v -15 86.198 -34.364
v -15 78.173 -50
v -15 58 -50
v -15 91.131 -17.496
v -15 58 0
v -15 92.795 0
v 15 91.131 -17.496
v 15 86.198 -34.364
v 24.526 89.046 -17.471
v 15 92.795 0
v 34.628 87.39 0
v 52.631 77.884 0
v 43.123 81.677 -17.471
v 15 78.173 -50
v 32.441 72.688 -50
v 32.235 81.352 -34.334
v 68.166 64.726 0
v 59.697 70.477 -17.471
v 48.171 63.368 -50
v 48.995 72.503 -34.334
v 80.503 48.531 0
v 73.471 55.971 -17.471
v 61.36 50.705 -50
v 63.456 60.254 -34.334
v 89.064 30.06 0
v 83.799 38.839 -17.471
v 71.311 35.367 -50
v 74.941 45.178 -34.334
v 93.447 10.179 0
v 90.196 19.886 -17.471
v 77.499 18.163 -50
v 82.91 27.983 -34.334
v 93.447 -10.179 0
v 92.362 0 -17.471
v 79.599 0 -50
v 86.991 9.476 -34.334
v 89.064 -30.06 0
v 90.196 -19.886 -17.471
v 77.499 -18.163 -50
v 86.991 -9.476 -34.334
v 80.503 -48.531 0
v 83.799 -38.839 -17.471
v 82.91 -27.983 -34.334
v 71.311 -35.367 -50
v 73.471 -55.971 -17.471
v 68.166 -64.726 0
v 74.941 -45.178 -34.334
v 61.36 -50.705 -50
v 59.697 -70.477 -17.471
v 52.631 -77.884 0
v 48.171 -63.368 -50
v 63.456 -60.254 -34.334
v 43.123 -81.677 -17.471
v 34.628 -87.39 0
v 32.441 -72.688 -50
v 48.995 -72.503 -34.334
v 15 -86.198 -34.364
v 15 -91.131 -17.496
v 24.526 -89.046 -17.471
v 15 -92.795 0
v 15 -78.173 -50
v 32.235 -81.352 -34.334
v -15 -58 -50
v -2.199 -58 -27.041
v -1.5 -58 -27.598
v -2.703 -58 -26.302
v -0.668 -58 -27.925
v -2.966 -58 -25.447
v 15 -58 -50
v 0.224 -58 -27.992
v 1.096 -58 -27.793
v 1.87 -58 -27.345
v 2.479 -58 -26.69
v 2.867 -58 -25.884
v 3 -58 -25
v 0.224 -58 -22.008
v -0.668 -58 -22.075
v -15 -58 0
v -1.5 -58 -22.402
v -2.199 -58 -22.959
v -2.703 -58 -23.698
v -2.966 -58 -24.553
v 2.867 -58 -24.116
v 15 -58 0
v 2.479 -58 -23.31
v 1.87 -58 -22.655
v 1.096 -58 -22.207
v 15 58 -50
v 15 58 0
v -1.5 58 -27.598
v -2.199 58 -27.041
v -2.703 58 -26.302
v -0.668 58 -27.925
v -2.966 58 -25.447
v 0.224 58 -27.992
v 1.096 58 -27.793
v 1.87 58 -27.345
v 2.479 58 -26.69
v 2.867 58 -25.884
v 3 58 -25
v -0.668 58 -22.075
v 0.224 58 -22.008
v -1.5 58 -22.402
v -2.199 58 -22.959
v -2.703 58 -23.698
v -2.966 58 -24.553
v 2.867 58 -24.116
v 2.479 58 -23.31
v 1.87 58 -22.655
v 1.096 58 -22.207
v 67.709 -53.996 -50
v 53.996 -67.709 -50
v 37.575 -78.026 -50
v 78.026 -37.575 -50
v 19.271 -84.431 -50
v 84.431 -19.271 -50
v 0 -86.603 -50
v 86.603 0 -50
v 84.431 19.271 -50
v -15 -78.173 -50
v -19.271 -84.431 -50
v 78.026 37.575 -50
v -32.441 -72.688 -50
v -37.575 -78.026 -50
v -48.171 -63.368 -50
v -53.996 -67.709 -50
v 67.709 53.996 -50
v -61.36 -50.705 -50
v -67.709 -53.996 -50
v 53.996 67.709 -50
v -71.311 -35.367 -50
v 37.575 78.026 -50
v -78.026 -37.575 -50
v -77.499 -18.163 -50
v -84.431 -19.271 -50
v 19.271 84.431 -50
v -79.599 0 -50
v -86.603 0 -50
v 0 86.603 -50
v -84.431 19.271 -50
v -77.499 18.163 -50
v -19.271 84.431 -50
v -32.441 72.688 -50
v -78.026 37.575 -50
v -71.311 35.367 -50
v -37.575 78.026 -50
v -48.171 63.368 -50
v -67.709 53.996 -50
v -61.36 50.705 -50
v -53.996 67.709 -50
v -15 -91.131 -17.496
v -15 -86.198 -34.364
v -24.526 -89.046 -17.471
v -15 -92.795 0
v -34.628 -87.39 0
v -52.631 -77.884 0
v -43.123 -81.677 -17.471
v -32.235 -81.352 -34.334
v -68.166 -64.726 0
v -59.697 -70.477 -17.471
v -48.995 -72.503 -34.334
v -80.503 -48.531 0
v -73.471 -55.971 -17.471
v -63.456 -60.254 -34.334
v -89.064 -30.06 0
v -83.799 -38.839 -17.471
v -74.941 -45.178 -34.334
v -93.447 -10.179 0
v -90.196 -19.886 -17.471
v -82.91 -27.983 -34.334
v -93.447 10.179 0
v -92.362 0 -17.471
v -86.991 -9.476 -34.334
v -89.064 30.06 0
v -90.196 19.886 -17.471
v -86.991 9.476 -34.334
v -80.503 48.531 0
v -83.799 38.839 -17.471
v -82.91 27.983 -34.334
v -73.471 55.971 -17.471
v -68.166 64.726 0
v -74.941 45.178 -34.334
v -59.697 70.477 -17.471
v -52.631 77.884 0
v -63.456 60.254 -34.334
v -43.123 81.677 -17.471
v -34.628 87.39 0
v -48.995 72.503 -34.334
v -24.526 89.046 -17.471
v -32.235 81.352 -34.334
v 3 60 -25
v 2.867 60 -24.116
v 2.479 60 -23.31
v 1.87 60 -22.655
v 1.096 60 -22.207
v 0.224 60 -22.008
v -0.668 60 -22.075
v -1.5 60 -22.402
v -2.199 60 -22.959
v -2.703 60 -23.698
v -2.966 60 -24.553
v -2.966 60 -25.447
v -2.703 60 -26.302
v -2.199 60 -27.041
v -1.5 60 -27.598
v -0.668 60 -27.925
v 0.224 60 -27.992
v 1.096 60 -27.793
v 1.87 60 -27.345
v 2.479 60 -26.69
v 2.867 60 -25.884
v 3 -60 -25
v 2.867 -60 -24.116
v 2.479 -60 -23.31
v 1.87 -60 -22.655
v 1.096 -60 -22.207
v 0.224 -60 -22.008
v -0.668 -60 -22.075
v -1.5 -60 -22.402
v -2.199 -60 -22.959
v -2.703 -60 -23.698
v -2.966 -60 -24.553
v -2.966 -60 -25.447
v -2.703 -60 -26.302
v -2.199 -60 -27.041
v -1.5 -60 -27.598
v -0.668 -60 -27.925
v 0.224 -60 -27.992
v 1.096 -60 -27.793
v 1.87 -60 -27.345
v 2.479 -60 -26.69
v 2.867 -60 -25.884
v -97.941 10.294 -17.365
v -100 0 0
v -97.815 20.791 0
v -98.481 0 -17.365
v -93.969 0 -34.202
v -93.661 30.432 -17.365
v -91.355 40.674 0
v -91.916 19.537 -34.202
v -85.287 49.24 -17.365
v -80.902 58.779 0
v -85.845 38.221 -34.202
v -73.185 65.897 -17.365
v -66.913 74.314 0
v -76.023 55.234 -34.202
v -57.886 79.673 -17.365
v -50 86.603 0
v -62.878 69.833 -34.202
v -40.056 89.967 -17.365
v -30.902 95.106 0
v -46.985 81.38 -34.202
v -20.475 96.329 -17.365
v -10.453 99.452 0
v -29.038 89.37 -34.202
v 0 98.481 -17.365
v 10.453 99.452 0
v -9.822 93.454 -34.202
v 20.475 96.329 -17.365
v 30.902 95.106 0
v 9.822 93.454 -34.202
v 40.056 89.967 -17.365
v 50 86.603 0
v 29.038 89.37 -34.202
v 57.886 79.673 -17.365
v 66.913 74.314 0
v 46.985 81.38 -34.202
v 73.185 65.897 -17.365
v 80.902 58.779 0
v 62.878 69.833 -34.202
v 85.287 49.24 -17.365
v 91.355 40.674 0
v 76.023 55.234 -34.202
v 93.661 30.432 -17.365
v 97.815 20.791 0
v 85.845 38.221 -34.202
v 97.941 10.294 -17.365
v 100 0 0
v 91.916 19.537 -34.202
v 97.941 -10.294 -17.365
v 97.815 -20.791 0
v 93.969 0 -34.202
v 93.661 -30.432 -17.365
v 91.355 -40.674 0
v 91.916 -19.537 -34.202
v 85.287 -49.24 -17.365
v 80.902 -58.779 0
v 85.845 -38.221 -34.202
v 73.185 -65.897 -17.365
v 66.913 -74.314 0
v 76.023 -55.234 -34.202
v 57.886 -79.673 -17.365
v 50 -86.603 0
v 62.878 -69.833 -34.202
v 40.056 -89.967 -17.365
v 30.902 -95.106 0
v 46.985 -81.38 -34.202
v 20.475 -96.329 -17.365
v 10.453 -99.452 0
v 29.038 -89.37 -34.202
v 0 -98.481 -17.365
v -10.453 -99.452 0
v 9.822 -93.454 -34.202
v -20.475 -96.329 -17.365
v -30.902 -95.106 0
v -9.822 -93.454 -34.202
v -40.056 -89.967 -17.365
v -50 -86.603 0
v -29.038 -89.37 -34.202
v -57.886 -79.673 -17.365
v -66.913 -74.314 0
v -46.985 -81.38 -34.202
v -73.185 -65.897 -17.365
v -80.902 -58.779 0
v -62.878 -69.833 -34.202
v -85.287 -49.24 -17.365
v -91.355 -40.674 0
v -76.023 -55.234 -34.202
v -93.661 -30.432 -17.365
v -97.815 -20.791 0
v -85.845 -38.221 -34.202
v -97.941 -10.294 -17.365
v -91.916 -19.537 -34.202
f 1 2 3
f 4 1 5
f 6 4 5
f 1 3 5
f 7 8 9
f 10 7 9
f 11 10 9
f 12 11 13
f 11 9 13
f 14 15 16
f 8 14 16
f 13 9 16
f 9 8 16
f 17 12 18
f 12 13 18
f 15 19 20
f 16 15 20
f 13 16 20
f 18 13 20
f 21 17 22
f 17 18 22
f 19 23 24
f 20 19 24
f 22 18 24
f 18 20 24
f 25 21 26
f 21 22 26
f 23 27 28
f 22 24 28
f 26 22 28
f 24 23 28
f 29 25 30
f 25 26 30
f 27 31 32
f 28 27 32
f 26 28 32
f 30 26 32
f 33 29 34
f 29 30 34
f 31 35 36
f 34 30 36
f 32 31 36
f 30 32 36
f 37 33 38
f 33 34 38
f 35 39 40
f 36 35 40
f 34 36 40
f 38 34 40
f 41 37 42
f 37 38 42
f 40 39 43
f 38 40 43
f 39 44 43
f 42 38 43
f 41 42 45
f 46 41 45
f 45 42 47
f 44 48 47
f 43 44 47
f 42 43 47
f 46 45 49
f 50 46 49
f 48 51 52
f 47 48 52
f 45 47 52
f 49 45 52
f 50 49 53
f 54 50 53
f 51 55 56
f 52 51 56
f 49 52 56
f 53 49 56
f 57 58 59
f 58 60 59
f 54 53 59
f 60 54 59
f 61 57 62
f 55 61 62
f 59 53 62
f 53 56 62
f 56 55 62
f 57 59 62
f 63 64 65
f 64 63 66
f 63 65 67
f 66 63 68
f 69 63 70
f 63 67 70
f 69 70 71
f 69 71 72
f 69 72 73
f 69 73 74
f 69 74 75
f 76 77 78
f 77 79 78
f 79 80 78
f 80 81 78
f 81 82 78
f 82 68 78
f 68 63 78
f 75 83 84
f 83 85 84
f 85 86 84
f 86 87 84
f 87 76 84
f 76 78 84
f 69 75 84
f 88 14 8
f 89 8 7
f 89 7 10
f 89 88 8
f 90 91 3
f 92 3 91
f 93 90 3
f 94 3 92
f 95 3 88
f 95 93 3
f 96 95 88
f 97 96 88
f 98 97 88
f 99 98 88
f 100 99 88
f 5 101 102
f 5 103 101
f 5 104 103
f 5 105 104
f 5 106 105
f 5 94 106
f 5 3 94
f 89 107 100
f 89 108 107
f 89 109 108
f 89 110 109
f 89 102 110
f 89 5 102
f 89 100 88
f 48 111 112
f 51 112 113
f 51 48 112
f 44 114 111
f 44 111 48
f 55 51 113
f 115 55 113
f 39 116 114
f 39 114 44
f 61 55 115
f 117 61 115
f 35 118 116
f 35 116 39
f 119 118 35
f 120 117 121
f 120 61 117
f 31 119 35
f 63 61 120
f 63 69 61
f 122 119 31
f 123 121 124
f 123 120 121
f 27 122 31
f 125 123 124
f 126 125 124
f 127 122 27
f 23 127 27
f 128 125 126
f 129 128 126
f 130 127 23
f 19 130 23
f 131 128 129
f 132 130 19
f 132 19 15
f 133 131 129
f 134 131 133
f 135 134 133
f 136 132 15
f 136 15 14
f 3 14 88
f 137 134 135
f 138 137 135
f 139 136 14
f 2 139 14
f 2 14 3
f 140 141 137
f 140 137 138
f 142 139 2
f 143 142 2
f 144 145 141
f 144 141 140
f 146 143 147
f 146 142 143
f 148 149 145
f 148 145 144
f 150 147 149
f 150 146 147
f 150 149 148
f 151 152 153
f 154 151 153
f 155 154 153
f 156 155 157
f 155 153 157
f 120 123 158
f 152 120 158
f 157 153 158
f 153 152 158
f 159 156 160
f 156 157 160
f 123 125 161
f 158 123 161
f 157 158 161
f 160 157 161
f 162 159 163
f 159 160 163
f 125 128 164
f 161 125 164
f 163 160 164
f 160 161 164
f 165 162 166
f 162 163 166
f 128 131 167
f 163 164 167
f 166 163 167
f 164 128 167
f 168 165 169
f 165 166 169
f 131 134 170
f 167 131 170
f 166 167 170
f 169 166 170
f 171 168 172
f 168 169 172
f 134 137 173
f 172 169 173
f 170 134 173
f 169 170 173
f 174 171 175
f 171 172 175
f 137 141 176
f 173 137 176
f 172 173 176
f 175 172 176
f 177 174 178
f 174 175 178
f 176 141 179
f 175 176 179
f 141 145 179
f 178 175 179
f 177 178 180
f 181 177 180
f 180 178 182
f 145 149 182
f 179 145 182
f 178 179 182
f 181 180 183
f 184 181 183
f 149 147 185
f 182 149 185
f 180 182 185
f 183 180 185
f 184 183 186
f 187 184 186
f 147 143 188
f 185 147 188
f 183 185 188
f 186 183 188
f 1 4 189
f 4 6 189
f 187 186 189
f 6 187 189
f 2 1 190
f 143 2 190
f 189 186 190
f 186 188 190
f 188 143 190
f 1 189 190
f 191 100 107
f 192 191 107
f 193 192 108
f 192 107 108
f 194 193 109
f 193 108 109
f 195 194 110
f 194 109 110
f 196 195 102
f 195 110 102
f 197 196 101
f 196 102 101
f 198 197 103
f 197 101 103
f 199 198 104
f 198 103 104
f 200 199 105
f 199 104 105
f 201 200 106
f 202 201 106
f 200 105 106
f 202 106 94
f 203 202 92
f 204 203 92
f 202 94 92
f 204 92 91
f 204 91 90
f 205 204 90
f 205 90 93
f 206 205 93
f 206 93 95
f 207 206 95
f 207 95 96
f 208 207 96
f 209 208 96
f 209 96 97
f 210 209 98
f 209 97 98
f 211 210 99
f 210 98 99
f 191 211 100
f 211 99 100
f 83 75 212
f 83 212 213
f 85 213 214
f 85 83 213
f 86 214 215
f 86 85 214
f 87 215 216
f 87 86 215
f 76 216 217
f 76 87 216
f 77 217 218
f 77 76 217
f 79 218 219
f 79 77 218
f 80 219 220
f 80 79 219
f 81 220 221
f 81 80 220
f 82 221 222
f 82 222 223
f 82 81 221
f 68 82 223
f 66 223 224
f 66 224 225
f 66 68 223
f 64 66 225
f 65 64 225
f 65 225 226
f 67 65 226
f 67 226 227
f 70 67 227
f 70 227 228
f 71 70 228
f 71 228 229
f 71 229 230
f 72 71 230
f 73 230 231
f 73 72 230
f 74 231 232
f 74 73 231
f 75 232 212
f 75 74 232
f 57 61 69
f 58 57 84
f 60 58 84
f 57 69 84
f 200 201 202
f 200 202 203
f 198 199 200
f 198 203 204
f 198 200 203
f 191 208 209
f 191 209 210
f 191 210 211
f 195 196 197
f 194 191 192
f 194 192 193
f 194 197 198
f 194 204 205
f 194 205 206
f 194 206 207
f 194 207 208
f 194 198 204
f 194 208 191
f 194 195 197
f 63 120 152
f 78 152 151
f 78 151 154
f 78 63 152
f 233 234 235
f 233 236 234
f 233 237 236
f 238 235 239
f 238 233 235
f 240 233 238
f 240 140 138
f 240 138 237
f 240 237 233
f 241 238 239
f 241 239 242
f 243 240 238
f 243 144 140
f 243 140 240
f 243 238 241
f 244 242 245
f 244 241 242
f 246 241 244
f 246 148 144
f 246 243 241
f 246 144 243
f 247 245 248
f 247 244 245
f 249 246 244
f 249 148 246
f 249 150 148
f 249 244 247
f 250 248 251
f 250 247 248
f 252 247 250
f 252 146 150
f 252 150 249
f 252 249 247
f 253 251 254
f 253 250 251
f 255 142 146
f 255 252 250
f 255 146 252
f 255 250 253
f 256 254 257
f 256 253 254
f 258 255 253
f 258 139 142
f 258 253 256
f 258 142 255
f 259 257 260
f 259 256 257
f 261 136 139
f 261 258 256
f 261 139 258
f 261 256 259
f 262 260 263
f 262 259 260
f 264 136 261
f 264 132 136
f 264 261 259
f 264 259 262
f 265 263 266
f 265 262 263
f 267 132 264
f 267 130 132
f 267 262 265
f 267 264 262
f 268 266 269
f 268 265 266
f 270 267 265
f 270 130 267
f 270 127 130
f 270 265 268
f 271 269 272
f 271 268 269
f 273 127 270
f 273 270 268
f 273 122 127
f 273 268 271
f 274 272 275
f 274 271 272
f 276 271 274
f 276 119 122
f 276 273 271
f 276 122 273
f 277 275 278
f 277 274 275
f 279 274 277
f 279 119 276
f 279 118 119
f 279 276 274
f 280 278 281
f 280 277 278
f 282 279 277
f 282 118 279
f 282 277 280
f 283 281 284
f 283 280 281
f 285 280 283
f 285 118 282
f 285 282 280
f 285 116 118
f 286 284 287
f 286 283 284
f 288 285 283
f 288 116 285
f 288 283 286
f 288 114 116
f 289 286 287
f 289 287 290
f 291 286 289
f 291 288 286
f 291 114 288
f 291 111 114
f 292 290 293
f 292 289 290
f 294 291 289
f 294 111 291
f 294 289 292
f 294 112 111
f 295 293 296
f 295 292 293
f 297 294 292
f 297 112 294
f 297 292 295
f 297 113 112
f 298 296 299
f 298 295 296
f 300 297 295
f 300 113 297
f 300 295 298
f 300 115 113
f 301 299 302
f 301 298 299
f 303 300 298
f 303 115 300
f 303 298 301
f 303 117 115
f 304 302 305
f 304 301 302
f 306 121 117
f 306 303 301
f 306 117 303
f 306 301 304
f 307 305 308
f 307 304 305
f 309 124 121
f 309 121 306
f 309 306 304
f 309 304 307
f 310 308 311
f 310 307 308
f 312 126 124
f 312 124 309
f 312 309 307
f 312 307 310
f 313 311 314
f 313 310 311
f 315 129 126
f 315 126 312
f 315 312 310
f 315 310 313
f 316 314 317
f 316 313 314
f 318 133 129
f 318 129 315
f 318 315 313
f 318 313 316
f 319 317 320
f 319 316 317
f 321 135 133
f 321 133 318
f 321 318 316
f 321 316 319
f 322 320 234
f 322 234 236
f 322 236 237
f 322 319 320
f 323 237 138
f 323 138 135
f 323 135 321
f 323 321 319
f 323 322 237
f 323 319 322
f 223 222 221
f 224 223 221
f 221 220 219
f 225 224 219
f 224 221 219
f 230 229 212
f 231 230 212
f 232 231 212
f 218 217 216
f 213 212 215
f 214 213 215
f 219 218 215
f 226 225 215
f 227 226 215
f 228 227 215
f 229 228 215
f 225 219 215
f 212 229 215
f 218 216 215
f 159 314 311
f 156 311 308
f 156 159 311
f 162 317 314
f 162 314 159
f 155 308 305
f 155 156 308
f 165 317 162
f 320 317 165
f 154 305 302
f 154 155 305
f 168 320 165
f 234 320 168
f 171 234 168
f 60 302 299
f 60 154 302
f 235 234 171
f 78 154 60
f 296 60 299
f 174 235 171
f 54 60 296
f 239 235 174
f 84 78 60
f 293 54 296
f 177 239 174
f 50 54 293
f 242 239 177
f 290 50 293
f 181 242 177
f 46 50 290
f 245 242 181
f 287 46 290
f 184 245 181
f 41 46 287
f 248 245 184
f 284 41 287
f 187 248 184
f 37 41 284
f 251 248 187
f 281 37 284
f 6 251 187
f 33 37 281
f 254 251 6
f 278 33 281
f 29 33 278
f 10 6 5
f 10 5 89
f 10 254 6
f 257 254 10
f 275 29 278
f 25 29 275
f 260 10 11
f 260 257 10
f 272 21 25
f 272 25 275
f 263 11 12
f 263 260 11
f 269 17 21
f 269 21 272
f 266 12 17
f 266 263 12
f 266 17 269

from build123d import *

# Parameters (mm, degrees)
F2_T     = -6
F4_W     = 30
F4_H     = 50
F6_R     = 3
F7_DEPTH = 2


# Not quite as in the source:
# - a pattern or mirror of a feature is missing from the dataset's text; its kind, count and spacing are read off the source's solid


with BuildPart() as f1:
    # F0 (on Front) → F1 (revolve)
    with BuildSketch(Plane.XZ):
        with BuildLine():
            Line((0, 0), (-100, 0))
            ThreePointArc((-100, 0), (-96.5925826289, -25.8819045103), (-86.6025403784, -50))
            Line((-86.6025403784, -50), (0, -50))
            Line((0, -50), (0, 0))
        make_face()
    revolve(axis=Axis((0, 0, -25), (0, 0, -1)))

    # F2
    f2_openings = [f1.faces().sort_by_distance(p)[0] for p in [
        (0, 0, 0),
        (0, 0, -50),
    ]]
    offset(amount=F2_T, openings=f2_openings)

    # F4 (on offset) → F5 (join, up to the next surface of F1)
    with BuildSketch(Plane.XZ.offset(-58)):
        with Locations((0, -25)):
            Rectangle(F4_W, F4_H)
    f5 = extrude(until=Until.NEXT, dir=(0, 1, 0))

    # F5_copies: F5 across plane
    add(f5.mirror(Plane(origin=(0, 0, 0), x_dir=(0, 0, -1), z_dir=(0, -1, 0))))

    # F6 (on face) → F7 (cut)
    with BuildSketch(Plane.XZ.offset(-58)):
        with Locations((0, -25)):
            Circle(F6_R)
    f7 = extrude(amount=-F7_DEPTH, mode=Mode.SUBTRACT)

    # F7_copies: F7 across plane
    add(f7.mirror(Plane(origin=(0, 0, 0), x_dir=(0, 0, -1), z_dir=(0, -1, 0))), mode=Mode.SUBTRACT)


solid = f1.part
